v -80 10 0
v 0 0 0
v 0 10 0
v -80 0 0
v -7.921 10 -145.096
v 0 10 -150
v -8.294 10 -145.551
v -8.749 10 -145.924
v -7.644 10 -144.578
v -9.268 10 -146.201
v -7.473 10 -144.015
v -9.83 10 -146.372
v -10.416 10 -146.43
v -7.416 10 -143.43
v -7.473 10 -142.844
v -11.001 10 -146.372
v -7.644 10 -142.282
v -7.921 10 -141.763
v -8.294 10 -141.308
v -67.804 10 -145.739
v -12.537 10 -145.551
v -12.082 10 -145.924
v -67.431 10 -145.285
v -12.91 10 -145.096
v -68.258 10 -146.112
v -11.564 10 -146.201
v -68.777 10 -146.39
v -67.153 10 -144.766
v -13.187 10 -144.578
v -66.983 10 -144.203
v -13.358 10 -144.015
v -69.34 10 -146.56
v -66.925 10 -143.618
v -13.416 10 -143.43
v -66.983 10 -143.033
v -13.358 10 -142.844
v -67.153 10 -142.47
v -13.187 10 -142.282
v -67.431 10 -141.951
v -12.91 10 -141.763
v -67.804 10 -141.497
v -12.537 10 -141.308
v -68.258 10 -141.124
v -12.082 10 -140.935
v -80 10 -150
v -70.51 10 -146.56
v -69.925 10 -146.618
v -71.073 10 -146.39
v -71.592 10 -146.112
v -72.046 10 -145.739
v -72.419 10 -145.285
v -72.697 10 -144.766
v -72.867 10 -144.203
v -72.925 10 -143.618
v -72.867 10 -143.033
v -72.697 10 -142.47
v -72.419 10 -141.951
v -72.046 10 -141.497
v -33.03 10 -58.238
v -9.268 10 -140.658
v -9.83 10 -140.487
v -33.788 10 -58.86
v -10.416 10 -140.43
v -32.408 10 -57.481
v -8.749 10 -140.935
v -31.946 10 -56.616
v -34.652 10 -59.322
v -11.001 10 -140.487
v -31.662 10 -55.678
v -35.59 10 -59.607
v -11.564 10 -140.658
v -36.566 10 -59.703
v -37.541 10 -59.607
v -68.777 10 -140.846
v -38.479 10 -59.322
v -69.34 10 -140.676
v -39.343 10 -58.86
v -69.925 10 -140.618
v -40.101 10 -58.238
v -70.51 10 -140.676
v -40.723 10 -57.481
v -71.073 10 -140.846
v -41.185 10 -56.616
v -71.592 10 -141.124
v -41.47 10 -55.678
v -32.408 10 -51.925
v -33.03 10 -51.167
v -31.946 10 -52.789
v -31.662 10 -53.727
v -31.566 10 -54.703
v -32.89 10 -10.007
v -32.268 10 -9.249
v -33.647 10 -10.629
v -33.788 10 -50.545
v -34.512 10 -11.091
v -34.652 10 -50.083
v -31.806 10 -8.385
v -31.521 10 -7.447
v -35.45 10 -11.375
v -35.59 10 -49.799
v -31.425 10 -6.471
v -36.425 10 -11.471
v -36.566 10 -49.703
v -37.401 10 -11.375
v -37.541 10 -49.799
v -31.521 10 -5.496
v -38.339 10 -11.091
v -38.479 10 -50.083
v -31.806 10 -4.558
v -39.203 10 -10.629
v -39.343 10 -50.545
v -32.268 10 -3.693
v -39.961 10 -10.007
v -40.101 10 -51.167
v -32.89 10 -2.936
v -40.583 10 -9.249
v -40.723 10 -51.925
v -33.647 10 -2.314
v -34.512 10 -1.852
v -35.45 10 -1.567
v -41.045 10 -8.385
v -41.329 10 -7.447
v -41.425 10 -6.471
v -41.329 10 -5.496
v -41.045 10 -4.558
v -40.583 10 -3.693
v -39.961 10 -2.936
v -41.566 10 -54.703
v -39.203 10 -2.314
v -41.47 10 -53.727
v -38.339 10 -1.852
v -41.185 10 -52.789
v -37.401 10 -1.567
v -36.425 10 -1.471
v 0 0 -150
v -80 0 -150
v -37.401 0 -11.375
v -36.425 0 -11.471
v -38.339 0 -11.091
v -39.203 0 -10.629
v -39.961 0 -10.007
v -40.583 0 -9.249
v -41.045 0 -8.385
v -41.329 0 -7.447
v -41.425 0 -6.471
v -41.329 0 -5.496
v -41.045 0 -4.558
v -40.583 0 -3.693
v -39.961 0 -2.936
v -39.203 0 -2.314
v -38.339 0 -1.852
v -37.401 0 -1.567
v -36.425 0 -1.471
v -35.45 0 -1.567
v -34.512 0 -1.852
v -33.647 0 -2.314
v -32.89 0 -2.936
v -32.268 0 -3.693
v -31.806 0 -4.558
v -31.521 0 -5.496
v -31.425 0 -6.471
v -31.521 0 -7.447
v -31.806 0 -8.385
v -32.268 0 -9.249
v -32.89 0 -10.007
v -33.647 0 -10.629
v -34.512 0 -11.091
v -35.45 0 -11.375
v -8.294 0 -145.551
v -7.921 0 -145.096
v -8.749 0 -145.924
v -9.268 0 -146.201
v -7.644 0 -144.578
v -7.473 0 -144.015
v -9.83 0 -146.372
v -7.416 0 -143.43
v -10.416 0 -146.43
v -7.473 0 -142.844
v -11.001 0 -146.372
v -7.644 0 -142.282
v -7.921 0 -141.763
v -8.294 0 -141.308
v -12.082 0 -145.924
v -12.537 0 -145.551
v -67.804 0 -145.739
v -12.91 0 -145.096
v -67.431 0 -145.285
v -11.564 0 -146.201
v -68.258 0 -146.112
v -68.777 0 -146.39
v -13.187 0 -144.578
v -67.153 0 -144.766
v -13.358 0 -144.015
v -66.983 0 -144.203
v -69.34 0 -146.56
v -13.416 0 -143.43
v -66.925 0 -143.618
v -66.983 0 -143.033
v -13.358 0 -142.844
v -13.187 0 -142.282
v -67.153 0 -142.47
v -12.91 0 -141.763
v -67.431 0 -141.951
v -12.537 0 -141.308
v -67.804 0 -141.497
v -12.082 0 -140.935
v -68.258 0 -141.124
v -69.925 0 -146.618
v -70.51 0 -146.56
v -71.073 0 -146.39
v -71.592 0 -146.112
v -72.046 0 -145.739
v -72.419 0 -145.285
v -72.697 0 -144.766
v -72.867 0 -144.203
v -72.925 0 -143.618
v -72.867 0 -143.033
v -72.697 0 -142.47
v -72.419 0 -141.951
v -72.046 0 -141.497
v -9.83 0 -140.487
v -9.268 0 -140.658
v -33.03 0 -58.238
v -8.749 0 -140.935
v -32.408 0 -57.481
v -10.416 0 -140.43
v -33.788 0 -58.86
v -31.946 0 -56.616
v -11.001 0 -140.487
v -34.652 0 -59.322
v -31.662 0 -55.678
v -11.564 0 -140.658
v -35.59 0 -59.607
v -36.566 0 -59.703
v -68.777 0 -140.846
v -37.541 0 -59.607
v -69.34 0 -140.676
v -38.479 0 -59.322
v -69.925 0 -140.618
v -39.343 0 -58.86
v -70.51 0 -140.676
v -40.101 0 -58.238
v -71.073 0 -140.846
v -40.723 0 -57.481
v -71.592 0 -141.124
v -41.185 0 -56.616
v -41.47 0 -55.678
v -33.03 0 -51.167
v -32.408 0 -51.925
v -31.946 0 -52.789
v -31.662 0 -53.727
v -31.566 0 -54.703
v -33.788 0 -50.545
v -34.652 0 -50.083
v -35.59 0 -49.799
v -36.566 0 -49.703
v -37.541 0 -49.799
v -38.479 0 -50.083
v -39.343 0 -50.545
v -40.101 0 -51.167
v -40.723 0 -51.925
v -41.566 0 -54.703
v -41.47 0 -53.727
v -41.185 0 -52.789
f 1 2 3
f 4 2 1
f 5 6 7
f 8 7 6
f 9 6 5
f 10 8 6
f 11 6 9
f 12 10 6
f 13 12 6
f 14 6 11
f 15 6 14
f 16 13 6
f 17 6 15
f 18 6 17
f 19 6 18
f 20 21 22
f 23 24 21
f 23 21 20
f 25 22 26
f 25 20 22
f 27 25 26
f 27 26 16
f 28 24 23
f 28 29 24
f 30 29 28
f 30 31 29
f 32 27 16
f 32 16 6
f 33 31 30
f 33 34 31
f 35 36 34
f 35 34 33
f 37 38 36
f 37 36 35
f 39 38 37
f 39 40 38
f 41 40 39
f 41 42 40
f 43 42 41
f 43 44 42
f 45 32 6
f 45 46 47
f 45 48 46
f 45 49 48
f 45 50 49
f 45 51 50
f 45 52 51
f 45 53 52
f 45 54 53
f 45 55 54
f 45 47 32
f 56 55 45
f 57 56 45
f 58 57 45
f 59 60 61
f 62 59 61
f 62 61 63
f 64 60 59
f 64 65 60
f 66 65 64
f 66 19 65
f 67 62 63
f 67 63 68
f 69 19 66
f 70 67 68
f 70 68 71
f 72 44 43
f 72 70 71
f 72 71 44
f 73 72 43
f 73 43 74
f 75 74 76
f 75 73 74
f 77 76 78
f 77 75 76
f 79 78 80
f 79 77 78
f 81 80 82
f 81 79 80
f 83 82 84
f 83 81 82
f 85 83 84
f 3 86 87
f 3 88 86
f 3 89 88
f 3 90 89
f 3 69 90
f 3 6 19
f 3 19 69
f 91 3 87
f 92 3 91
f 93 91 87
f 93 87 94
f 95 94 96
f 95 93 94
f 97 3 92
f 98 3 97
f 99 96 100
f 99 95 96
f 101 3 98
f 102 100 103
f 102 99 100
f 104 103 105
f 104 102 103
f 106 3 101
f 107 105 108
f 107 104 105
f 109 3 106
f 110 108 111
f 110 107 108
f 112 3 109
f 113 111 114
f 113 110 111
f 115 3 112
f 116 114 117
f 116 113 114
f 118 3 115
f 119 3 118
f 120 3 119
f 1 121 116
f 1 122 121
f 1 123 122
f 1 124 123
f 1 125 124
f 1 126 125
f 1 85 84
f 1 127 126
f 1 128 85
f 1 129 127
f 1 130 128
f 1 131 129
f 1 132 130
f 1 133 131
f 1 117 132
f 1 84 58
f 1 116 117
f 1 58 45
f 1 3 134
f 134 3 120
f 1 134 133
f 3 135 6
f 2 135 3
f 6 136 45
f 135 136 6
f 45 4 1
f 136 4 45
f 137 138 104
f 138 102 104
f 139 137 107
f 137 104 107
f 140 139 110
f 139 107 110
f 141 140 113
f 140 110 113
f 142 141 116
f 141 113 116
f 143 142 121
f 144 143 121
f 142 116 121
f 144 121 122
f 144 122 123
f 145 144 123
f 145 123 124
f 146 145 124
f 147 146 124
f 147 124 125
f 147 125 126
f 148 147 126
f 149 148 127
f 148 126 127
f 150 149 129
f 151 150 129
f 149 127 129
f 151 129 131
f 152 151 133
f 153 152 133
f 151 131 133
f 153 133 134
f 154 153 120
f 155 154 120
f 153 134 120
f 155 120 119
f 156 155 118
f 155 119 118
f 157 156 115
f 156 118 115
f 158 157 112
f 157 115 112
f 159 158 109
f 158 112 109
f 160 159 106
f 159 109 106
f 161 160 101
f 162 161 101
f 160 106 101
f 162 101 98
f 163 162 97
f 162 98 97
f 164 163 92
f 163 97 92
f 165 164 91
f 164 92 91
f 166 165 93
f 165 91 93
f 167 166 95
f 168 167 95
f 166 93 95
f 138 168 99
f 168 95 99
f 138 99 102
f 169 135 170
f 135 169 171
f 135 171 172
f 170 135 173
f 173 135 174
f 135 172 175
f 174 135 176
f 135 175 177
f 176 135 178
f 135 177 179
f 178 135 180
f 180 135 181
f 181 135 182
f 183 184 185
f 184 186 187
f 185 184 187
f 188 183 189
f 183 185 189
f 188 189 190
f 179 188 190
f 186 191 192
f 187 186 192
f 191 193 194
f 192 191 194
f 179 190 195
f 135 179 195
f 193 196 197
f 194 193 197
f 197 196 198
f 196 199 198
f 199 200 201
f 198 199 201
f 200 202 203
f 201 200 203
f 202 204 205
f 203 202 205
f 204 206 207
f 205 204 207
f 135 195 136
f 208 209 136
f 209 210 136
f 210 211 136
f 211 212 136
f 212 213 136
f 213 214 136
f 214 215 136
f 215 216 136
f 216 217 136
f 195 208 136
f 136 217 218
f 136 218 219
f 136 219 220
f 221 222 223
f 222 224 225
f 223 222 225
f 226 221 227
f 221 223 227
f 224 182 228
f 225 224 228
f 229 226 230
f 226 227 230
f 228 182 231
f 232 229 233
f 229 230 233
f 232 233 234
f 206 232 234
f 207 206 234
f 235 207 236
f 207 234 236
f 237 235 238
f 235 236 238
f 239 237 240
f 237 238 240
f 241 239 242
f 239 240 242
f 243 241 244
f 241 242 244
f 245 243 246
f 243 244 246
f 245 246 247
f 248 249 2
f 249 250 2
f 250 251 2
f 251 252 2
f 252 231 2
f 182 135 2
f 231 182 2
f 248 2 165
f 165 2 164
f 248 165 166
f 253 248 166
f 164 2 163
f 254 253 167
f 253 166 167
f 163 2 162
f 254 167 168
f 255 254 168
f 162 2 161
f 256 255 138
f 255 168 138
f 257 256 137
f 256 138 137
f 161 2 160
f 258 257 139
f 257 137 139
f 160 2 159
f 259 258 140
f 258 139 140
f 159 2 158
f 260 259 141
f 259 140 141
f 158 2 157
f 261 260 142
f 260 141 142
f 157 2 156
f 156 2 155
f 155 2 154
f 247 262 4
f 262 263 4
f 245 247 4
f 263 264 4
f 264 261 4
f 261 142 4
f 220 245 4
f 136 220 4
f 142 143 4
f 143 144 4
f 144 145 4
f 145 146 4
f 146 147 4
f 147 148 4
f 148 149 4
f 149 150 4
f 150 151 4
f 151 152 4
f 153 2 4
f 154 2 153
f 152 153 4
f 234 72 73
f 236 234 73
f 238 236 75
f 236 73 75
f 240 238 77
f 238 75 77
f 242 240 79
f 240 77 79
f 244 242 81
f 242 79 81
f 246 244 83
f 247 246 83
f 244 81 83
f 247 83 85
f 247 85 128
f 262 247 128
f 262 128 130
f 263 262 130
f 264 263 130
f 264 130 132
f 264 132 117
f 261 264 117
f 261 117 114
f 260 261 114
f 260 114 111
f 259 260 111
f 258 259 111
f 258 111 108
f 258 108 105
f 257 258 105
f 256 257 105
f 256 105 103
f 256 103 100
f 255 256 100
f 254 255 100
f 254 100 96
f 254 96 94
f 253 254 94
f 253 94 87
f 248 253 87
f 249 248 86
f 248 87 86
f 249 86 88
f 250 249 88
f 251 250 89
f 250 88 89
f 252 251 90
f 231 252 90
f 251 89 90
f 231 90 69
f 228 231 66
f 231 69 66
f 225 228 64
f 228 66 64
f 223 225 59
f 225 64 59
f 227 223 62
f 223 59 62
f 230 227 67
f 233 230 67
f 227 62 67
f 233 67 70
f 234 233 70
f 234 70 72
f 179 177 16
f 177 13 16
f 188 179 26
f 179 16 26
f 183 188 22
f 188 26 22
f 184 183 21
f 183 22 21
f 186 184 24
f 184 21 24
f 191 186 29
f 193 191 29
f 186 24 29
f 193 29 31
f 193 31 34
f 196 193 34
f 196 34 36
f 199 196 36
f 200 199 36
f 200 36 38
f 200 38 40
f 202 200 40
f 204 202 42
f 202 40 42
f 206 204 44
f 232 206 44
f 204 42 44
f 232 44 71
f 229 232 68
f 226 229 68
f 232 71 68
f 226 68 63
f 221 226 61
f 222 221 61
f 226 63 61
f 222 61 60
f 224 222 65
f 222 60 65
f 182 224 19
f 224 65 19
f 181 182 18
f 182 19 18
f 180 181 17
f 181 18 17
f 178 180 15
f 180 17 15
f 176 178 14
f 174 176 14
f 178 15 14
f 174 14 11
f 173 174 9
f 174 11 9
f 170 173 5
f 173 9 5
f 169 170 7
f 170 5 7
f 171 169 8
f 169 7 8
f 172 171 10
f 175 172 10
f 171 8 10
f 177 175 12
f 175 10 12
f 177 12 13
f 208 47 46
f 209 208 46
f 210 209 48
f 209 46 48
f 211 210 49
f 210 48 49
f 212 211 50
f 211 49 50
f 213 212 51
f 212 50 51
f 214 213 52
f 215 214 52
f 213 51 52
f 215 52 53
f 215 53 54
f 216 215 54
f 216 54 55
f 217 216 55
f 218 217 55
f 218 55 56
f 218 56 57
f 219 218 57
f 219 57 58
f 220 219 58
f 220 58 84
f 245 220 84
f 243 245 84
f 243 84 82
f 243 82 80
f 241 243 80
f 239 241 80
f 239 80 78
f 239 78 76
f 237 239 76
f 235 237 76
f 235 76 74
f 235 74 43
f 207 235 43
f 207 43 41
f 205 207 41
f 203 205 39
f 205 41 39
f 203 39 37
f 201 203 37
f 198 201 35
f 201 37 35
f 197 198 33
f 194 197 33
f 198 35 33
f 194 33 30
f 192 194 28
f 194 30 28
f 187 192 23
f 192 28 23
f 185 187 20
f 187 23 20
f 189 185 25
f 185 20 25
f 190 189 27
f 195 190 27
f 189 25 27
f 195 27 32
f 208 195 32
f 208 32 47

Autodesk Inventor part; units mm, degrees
ref_plane "YZ Plane" through (0, 0, 0) normal (1, 0, 0) x (0, 1, 0)
ref_plane "XZ Plane" through (0, 0, 0) normal (0, 1, 0) x (-1, 0, 0)
ref_plane "XY Plane" through (0, 0, 0) normal (0, 0, 1) x (1, 0, 0)
sketch "Sketch1" plane through (0, 0, 0) normal (0, 1, 0) x (-1, 0, 0)
  line L0 (0, 0) -> (80, 0)
  line L1 (80, 0) -> (80, -150)
  line L2 (80, -150) -> (0, -150)
  line L3 (0, -150) -> (0, 0)
  dimension "d0" = 80
  dimension "d1" = 150
extrude "Extrusion1" add sketch "Sketch1" along normal blind 10
sketch "Sketch2" plane through (0, 0, 0) normal (0, -1, 0) x (1, 0, 0)
  point P0 (0, 0)
  point P1 (-10.4156, -143.4297)
  point P2 (-69.925, -143.618)
hole "Hole1" at (-10.4156, 0, -143.4297) at (-69.925, 0, -143.618) direction (0, 1, 0) diameter 6 end through all
sketch "Sketch3" plane through (0, 0, 0) normal (0, -1, 0) x (1, 0, 0)
  point P0 (0, 0)
  point P1 (-36.5656, -54.7027)
  point P2 (-36.4253, -6.4713)
hole "Hole2" at (-36.5656, 0, -54.7027) at (-36.4253, 0, -6.4713) direction (0, 1, 0) diameter 10 end through all
